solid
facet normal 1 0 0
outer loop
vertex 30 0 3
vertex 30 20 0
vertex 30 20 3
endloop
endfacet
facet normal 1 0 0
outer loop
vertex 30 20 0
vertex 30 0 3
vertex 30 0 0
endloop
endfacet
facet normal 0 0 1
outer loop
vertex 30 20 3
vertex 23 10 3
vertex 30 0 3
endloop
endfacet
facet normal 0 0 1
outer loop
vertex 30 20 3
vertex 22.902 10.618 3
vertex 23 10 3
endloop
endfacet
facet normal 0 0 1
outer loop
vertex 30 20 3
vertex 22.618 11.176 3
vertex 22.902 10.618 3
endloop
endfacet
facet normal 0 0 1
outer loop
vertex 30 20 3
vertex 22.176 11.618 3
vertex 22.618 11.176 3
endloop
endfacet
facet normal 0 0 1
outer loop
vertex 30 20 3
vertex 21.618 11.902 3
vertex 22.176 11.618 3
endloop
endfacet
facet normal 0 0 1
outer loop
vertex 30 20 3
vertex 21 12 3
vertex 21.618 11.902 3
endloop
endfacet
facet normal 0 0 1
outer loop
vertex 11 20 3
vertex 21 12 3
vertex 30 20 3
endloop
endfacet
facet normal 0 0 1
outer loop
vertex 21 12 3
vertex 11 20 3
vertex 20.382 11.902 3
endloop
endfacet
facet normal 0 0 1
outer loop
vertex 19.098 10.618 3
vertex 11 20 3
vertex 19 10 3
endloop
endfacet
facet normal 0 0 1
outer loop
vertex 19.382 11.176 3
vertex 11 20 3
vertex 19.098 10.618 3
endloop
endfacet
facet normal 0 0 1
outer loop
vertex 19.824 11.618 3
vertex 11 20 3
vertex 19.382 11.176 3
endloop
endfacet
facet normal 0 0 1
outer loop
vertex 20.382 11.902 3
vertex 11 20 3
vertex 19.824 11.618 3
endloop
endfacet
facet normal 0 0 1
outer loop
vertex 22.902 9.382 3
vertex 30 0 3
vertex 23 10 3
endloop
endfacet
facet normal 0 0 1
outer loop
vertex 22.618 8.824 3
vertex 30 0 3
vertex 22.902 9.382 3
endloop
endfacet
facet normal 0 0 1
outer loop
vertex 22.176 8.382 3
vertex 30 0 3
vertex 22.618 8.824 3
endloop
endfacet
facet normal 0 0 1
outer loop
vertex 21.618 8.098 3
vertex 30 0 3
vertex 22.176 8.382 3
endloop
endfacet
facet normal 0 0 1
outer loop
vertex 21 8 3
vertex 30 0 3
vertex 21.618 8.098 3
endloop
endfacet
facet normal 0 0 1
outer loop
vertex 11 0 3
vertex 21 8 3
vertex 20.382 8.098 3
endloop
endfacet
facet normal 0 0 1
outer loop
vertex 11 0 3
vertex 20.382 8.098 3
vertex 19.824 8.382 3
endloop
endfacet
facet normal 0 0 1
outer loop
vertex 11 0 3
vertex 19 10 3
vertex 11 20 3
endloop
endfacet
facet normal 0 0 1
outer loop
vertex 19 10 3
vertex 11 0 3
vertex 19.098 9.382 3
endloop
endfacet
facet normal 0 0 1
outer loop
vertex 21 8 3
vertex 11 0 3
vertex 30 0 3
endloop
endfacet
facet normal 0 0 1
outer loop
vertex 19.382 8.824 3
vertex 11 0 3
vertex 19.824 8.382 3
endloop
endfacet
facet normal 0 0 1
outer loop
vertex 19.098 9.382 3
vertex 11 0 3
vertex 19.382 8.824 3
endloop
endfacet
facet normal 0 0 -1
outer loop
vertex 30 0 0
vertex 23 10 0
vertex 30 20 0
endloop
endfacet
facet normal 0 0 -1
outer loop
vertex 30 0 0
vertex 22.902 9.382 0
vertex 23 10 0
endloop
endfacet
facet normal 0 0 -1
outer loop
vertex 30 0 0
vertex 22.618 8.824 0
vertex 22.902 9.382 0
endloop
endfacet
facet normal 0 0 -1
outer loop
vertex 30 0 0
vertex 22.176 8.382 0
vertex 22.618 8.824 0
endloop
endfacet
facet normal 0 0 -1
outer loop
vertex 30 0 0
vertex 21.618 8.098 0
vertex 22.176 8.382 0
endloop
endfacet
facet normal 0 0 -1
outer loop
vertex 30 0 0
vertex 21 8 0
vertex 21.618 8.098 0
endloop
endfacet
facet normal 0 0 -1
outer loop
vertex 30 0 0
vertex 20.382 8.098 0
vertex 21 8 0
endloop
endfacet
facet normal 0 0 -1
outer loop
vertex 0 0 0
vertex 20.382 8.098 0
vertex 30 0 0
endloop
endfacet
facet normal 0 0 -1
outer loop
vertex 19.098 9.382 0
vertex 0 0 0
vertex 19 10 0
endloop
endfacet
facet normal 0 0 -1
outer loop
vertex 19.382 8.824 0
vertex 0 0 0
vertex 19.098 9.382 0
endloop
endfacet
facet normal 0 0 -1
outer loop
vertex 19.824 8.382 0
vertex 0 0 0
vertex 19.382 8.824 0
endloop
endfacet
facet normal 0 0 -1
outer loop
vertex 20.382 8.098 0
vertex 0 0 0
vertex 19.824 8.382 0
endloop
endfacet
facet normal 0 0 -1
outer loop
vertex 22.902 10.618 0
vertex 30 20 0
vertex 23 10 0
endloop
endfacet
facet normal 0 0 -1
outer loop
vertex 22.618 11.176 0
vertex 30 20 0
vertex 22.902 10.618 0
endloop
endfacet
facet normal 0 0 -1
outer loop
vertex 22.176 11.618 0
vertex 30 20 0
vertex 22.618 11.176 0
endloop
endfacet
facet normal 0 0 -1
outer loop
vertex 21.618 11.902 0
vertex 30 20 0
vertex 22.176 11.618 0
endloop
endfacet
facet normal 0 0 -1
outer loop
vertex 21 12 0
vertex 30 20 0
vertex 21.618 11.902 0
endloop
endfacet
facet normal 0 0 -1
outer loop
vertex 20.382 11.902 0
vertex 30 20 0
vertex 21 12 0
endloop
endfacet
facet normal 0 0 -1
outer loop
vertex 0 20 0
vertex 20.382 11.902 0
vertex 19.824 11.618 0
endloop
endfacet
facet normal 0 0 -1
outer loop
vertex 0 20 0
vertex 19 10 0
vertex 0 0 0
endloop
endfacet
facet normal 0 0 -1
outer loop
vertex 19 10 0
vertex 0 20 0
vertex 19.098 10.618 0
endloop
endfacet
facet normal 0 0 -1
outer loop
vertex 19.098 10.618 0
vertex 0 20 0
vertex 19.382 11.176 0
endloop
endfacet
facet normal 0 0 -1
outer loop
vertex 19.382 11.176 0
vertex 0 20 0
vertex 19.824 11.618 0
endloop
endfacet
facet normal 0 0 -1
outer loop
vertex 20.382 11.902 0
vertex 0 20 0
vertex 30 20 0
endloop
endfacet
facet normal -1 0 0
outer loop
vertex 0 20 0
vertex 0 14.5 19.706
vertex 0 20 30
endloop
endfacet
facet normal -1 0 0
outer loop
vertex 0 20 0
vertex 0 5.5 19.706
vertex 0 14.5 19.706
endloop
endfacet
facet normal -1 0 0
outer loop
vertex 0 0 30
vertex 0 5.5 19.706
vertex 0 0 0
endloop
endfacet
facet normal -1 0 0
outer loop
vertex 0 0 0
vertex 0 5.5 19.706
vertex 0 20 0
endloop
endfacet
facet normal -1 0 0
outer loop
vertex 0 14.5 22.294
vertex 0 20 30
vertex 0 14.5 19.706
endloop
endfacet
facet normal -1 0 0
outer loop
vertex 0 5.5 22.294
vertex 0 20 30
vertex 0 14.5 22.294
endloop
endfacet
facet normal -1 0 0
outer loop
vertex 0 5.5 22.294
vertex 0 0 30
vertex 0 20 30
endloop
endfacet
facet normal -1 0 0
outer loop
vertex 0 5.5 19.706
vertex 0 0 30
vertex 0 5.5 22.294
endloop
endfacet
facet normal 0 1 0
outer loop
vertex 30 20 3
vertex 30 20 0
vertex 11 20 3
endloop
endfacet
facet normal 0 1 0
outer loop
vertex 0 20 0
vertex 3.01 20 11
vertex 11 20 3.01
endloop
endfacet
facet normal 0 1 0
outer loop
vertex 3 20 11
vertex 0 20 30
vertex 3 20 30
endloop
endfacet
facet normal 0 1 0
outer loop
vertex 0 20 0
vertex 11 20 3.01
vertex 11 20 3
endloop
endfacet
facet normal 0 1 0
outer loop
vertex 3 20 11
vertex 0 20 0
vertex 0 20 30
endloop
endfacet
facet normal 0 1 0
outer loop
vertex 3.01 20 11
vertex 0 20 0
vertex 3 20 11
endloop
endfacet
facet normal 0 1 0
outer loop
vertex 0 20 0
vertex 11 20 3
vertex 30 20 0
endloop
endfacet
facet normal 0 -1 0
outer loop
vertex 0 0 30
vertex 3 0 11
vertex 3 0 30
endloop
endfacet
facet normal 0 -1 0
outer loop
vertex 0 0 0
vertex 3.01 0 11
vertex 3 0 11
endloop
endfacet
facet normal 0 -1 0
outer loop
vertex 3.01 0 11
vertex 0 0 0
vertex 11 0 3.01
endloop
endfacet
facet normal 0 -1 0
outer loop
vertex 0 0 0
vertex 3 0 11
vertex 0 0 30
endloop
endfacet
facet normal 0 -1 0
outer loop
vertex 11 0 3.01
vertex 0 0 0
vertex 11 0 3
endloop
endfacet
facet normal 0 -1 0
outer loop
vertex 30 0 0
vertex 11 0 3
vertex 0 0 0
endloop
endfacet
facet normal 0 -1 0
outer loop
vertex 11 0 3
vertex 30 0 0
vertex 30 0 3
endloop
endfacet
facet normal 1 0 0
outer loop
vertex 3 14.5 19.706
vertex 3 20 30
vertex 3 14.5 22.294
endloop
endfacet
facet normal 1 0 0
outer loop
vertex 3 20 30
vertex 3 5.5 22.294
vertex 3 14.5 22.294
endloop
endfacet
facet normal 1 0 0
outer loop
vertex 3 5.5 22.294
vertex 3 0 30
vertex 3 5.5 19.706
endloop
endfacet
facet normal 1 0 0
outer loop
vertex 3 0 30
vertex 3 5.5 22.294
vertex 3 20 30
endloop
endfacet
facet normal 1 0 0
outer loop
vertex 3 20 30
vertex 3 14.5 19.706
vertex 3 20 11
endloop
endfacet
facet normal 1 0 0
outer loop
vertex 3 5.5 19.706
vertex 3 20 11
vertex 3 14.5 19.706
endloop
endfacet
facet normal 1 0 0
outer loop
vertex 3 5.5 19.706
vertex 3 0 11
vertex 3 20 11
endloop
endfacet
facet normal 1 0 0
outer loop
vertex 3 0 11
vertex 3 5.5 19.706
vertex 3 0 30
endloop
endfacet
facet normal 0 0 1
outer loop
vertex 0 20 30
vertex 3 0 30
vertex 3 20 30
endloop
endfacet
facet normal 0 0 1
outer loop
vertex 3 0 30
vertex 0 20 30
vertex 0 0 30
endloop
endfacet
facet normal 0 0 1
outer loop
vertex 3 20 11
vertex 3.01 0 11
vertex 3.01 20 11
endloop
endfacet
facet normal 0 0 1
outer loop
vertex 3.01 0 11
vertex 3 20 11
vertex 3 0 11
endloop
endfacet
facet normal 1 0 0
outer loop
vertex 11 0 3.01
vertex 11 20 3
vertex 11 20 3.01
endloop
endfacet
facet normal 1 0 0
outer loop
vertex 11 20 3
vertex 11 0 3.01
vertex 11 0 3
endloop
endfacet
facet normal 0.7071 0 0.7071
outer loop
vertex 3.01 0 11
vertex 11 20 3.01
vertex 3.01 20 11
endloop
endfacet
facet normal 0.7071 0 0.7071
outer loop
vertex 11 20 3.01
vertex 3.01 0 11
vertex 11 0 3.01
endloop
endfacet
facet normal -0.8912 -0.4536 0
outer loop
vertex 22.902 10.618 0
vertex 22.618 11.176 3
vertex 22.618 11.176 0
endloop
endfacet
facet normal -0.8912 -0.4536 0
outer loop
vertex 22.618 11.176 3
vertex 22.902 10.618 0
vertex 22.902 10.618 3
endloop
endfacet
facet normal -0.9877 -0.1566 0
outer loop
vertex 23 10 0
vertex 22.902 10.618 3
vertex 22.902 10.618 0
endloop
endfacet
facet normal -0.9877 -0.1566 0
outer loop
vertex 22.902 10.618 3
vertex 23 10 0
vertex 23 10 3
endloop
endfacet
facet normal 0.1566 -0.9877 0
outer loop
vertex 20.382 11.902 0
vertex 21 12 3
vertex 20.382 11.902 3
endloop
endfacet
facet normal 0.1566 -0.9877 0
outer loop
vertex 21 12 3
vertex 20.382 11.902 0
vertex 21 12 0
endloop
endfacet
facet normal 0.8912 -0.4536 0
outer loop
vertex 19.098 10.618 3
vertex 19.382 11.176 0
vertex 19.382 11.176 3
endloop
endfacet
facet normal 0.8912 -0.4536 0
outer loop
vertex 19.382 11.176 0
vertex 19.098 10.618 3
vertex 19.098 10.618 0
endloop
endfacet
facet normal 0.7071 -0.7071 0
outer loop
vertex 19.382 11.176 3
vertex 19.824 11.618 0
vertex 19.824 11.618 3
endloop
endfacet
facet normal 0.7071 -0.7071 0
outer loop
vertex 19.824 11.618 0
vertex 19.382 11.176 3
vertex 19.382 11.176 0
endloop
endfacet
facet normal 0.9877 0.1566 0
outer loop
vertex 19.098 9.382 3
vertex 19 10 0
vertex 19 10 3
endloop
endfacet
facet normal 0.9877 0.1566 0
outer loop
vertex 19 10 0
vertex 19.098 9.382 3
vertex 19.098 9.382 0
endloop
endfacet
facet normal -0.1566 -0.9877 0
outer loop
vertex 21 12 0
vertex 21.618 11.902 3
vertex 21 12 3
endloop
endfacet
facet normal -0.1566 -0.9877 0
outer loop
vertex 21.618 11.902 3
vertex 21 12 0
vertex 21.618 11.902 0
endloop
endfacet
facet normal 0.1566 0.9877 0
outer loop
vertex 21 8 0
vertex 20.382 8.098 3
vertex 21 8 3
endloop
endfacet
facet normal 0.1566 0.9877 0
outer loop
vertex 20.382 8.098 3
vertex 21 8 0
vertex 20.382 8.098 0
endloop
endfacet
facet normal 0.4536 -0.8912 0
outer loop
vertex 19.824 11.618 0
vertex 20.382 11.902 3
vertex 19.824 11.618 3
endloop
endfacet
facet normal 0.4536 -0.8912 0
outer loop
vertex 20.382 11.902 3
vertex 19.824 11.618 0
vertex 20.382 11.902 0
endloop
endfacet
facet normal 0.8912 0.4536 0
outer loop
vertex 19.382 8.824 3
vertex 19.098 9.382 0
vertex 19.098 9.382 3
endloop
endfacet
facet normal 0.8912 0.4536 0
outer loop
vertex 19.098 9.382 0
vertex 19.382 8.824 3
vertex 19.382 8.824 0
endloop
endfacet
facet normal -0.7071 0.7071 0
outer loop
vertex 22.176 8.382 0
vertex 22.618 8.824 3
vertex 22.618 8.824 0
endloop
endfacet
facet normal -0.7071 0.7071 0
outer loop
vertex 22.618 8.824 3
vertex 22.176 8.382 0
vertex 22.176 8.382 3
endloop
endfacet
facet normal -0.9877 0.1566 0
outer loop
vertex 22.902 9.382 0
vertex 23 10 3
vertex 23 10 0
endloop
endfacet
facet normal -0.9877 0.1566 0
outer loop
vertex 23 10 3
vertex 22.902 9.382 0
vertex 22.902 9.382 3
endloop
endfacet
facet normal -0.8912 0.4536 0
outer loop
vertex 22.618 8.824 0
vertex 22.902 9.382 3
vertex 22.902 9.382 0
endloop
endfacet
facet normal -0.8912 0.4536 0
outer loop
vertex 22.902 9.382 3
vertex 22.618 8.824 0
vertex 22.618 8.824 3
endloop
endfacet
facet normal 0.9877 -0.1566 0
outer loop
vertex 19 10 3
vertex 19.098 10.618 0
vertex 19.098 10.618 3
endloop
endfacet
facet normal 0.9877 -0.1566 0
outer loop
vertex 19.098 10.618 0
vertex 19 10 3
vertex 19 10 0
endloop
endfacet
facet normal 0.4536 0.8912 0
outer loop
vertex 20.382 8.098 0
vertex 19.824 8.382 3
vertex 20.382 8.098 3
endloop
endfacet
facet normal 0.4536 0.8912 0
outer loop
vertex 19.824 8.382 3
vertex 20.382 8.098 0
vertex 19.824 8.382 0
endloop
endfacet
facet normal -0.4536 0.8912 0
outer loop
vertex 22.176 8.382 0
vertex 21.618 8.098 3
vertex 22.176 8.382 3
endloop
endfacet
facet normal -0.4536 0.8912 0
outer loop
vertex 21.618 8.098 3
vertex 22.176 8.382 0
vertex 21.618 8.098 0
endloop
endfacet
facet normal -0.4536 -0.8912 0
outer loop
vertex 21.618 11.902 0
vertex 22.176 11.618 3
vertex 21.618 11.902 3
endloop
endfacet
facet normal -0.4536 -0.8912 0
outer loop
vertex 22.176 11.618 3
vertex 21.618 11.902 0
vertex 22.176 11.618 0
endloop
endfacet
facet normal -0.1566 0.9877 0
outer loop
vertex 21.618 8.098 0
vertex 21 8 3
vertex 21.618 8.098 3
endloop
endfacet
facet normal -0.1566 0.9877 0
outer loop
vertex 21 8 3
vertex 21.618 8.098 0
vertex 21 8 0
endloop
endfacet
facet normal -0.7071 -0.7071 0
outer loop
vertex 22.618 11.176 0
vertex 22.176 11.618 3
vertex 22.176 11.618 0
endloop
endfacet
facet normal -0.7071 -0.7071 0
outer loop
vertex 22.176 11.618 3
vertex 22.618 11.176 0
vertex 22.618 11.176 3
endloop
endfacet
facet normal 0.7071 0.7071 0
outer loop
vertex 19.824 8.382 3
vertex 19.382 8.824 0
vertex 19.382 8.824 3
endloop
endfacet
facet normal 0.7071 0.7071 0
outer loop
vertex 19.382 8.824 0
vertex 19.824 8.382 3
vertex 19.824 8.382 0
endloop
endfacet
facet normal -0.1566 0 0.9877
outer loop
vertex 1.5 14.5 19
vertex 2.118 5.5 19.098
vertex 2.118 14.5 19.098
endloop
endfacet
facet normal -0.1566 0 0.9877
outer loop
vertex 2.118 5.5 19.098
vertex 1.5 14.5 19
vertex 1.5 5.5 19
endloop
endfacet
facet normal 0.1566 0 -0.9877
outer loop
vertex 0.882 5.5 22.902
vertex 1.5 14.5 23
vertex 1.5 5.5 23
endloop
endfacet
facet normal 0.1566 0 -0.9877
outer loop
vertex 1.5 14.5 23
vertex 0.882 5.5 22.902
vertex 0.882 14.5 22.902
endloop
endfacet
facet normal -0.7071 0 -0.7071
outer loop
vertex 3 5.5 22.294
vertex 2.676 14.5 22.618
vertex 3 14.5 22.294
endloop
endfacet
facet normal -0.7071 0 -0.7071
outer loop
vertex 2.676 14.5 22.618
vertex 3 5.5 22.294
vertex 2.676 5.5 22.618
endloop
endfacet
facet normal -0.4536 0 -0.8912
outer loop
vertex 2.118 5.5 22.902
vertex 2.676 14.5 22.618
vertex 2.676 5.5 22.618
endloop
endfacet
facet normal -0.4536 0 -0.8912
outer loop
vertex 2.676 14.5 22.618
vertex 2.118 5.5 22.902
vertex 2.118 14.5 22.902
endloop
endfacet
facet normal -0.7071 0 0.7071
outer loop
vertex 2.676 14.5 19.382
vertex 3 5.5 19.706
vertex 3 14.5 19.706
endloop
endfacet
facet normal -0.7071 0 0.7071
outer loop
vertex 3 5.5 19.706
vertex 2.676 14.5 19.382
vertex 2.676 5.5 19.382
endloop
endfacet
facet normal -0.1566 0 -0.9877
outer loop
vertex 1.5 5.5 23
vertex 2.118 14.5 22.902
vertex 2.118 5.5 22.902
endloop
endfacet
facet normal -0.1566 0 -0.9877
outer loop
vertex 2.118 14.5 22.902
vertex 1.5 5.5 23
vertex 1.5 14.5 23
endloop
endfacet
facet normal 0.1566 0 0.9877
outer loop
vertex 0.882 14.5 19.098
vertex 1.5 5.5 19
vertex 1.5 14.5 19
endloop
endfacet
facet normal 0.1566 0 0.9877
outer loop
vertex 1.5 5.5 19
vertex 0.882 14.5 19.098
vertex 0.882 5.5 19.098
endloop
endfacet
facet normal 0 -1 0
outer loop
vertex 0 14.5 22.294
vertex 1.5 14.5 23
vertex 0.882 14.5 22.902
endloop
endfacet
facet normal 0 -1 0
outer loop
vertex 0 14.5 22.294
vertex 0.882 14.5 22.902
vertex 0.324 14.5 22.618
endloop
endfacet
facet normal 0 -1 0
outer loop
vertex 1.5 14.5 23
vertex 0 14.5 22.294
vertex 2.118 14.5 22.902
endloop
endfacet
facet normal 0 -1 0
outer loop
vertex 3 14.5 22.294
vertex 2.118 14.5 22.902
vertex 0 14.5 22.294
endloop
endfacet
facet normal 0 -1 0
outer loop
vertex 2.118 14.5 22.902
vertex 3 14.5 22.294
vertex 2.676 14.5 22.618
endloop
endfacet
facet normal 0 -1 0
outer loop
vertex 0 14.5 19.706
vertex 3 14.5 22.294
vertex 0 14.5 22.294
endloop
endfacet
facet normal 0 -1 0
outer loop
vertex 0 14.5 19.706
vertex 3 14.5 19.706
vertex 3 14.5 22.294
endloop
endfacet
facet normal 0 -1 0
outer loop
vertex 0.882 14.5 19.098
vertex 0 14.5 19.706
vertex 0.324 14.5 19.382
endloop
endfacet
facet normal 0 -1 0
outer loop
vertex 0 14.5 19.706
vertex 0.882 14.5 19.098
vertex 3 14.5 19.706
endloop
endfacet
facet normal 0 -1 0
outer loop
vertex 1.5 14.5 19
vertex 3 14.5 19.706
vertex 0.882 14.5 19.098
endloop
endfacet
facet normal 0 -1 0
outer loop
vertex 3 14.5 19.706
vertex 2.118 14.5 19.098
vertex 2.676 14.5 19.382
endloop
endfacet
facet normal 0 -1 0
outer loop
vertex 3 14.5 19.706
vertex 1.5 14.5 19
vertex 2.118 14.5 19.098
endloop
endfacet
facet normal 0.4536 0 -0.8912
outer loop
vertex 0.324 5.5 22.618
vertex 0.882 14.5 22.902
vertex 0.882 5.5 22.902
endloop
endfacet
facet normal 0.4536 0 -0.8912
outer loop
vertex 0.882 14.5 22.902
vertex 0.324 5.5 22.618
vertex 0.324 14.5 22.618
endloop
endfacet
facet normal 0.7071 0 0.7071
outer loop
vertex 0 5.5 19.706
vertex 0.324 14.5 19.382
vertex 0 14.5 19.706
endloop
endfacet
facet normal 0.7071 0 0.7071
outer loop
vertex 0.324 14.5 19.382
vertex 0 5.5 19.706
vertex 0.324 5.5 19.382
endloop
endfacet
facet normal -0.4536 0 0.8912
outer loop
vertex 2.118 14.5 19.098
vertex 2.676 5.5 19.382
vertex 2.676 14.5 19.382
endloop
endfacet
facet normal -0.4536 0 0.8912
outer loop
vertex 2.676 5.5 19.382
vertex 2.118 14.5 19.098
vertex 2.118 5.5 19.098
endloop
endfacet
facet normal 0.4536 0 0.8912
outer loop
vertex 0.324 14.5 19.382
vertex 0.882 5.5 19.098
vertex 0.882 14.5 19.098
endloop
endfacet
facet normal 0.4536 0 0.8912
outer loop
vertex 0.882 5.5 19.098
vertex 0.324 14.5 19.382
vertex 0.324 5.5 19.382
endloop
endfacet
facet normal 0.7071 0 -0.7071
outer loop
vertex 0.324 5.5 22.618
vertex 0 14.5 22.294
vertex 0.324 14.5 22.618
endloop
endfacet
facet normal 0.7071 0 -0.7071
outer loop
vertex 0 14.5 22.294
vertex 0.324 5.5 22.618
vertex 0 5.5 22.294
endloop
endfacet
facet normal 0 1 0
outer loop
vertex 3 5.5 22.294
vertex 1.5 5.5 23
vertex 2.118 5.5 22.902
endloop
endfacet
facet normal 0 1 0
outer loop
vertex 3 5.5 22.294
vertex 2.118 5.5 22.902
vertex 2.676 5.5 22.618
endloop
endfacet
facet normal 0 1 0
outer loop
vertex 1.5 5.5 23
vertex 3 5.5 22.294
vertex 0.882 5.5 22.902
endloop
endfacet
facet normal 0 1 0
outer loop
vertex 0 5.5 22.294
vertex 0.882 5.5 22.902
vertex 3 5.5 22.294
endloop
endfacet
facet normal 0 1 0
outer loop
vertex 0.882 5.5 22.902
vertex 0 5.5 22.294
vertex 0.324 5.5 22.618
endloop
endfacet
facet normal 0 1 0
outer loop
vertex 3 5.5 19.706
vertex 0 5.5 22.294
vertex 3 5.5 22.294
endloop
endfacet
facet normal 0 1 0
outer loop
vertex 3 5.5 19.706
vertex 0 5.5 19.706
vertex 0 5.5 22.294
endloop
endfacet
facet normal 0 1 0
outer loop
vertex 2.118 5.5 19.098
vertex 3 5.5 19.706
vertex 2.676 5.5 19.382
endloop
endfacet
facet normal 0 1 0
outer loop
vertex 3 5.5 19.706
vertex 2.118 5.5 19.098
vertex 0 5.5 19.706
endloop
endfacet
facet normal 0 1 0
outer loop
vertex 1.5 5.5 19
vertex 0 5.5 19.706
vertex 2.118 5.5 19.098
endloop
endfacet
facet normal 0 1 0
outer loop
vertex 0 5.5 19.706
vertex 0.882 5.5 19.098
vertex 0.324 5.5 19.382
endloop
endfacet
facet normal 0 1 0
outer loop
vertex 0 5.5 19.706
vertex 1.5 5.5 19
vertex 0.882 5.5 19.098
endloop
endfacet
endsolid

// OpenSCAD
// L bracket with chamfer and mounting holes.
t = 3;
l = 30;
w = 20;
module plate(size) cube(size);
module hole_at(p, d = 4) translate(p) rotate([90, 0, 0]) cylinder(d = d, h = 3 * t, center = true, $fn = 20);
difference() {
  union() {
    plate([l, w, t]);
    plate([t, w, l]);
    hull() {
      translate([t, 0, t]) cube([0.01, w, 8]);
      translate([t, 0, t]) cube([8, w, 0.01]);
    }
  }
  translate([l * 0.7, w / 2, 0]) rotate([0, 0, 0]) cylinder(d = 4, h = 3 * t, center = true, $fn = 20);
  hole_at([t / 2, w / 2, l * 0.7]);
}
